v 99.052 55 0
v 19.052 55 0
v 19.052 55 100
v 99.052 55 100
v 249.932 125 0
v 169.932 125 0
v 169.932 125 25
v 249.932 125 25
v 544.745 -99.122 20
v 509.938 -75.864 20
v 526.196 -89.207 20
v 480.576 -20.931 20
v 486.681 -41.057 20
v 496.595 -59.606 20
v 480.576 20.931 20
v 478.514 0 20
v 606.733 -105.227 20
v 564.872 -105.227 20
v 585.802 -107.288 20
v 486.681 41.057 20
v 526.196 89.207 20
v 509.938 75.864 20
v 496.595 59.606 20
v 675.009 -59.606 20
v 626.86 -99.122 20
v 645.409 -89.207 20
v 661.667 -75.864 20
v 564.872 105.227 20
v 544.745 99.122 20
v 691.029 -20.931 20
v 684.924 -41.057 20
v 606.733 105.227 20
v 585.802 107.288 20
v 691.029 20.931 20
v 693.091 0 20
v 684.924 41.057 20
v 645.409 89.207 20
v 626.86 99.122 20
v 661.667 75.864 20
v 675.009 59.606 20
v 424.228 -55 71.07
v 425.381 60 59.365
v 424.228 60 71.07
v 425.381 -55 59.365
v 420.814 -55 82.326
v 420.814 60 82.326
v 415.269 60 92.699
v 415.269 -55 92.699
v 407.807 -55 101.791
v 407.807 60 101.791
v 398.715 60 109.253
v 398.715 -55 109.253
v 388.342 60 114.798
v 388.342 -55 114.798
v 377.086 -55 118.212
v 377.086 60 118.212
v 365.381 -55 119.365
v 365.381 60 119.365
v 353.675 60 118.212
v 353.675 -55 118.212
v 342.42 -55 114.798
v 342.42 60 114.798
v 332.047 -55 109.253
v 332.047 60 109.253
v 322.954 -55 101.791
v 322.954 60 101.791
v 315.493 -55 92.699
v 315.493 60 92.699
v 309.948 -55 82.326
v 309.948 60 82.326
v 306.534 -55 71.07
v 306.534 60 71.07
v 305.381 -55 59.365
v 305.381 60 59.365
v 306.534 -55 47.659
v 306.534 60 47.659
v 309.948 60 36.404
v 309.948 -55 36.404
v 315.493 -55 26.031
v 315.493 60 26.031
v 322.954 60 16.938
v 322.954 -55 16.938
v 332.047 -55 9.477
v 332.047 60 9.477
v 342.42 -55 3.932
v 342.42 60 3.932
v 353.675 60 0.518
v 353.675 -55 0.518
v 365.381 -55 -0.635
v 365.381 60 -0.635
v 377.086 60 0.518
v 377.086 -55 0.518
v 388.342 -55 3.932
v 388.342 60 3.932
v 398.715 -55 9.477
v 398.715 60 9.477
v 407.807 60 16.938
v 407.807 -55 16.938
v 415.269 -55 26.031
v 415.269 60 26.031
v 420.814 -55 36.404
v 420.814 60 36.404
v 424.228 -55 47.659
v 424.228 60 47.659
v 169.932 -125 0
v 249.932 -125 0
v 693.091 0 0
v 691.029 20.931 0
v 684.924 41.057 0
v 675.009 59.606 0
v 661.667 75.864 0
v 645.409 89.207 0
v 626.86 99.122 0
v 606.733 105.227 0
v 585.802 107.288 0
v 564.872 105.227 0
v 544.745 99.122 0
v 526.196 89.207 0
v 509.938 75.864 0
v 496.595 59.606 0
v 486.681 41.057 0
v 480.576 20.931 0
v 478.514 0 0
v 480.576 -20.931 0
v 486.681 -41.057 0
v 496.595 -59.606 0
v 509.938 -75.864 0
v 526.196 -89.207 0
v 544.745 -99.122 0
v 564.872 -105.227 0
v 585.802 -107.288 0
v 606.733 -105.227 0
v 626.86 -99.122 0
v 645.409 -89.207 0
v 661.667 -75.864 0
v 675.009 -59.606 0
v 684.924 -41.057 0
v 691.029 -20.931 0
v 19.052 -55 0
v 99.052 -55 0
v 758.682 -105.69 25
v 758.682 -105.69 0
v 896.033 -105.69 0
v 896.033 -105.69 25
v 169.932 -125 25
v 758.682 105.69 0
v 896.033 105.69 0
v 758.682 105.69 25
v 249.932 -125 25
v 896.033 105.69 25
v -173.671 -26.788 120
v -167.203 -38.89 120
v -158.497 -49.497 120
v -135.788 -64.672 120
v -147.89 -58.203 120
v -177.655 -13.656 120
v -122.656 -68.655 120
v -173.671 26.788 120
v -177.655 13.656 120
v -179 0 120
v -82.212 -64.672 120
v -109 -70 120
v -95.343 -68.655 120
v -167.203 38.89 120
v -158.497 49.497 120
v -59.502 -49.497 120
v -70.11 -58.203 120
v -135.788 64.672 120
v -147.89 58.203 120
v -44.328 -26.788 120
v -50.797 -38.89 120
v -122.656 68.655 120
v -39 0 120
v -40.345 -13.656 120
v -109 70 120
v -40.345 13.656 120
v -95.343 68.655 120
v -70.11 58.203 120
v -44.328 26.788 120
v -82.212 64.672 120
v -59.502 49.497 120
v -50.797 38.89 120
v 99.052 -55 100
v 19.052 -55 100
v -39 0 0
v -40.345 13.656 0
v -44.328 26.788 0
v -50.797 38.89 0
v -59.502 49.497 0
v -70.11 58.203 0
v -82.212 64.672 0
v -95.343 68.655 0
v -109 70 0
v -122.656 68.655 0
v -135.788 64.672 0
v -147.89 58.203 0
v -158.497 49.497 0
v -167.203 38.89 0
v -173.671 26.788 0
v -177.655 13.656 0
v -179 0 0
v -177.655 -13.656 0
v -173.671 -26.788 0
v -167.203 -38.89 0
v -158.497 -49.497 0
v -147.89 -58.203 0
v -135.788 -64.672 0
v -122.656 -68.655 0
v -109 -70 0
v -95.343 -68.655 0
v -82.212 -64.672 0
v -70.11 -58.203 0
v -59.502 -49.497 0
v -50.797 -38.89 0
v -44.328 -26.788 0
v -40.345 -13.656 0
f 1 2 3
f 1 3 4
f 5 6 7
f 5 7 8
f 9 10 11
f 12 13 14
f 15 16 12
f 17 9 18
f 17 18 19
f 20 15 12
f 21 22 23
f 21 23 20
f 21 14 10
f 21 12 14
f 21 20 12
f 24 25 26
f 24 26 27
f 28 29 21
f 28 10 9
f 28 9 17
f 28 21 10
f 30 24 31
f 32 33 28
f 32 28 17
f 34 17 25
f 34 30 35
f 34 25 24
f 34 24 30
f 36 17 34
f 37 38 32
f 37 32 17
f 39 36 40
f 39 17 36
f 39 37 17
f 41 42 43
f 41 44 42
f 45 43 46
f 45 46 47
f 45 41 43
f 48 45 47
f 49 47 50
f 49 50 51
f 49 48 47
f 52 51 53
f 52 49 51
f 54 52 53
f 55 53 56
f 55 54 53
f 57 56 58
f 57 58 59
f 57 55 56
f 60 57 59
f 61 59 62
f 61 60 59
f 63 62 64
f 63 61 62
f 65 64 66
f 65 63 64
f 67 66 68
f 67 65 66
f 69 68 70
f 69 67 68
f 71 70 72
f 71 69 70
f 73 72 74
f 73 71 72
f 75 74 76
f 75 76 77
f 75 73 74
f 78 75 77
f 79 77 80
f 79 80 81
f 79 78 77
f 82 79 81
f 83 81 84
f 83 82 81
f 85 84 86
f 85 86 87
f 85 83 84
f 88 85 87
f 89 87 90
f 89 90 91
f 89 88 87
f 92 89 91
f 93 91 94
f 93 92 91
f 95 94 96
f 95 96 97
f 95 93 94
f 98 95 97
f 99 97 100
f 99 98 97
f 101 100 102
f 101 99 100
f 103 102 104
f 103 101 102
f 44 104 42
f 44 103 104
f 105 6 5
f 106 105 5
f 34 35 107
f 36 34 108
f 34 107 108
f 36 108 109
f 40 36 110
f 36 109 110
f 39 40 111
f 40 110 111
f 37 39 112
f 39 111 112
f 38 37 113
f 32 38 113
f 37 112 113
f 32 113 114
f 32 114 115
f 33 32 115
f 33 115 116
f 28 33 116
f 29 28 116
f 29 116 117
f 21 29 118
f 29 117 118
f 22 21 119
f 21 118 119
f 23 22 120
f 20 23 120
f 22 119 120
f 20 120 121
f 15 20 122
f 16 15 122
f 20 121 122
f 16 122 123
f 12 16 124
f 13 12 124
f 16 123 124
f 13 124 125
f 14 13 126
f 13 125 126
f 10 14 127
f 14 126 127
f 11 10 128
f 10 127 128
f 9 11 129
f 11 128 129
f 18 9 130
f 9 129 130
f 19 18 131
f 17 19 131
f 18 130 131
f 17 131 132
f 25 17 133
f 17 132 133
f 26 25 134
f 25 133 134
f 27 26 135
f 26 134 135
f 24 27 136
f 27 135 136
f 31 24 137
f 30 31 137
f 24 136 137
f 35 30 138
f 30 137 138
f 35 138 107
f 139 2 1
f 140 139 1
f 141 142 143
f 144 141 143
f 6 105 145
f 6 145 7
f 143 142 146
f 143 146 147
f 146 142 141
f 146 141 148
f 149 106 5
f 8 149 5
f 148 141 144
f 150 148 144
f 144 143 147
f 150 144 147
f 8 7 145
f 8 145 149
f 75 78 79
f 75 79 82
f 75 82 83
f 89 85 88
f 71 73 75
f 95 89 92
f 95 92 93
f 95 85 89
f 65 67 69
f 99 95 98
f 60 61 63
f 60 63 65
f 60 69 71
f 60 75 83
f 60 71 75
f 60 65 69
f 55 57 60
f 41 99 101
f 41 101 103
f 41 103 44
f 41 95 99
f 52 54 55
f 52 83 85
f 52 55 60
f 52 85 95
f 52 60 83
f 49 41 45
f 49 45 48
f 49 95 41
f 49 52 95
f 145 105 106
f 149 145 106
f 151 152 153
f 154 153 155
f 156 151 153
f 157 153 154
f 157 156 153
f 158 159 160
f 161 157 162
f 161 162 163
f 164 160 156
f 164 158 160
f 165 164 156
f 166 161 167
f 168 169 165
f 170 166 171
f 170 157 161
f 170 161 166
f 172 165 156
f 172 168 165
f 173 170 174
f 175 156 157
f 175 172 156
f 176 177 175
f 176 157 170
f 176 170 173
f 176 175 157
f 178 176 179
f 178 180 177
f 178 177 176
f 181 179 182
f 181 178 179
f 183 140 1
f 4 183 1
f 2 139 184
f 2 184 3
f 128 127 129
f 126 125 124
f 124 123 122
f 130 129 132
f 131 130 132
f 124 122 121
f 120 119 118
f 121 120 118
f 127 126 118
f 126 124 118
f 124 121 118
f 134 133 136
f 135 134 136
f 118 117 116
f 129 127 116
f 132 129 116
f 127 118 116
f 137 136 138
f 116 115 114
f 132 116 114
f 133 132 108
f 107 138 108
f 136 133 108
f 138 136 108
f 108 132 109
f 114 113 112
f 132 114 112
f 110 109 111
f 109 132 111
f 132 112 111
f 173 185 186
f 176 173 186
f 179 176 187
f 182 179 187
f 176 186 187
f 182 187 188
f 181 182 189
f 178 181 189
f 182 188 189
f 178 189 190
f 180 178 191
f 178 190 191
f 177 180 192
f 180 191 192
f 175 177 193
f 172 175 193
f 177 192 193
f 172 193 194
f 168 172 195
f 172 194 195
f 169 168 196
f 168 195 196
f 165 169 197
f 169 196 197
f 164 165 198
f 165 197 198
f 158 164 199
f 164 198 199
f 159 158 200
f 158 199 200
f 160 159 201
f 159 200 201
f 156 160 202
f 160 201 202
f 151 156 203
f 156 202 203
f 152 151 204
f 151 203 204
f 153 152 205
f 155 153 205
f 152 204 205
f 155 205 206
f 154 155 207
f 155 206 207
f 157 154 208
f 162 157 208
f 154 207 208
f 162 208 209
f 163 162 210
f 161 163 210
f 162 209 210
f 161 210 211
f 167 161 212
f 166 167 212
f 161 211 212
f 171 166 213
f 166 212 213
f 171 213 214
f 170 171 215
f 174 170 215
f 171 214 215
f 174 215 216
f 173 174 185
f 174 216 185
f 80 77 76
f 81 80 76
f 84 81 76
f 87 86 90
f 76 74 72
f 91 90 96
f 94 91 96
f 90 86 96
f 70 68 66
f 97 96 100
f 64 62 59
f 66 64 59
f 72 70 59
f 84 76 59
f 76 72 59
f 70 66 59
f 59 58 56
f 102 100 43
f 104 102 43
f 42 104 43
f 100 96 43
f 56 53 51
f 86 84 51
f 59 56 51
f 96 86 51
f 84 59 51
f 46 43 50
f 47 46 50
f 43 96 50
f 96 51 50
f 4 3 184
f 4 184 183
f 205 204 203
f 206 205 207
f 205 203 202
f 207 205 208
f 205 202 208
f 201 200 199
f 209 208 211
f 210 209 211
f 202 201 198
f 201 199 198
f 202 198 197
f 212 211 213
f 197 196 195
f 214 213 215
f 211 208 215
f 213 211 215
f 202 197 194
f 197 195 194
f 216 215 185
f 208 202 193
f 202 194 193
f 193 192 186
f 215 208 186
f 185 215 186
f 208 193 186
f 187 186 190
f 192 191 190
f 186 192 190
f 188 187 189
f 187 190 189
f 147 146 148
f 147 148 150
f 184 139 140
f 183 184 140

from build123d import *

# Parameters (mm, degrees)
F0_R          = 70
F1_DEPTH      = 120
F2_W          = 80
F2_H          = 110
F3_DEPTH      = 100
F4_W          = 80
F4_H          = 250
F5_DEPTH      = 25
F6_R          = 60
F7_DEPTH      = 55
F7_DEPTH_BACK = 60
F8_R          = 107.288389
F9_DEPTH      = 20
F10_W         = 137.351155
F10_H         = 211.380974
F11_DEPTH     = 25


with BuildPart() as f1:
    # F0 (on Top) → F1 (new body)
    with BuildSketch(Plane.XY):
        with Locations((-108.999747, 0)):
            Circle(F0_R)
    extrude(amount=F1_DEPTH)


with BuildPart() as f3:
    # F2 (on Top) → F3 (new body)
    with BuildSketch(Plane.XY):
        with Locations((59.051738, 0)):
            Rectangle(F2_W, F2_H)
    extrude(amount=F3_DEPTH)


with BuildPart() as f5:
    # F4 (on Top) → F5 (new body)
    with BuildSketch(Plane.XY):
        with Locations((209.931925, 0)):
            Rectangle(F4_W, F4_H)
    extrude(amount=F5_DEPTH)


with BuildPart() as f7:
    # F6 (on Front) → F7 (new body, two sides)
    with BuildSketch(Plane.XZ) as f7_sk:
        with Locations((365.380824, 59.364893)):
            Circle(F6_R)
    extrude(amount=F7_DEPTH)
    extrude(f7_sk.sketch, amount=-F7_DEPTH_BACK)


with BuildPart() as f9:
    # F8 (on Top) → F9 (new body)
    with BuildSketch(Plane.XY):
        with Locations((585.802436, 0)):
            Circle(F8_R)
    extrude(amount=F9_DEPTH)


with BuildPart() as f11:
    # F10 (on Top) → F11 (new body)
    with BuildSketch(Plane.XY):
        with Locations((827.357828, 0)):
            Rectangle(F10_W, F10_H)
    extrude(amount=F11_DEPTH)


solid = Compound([f1.part, f3.part, f5.part, f7.part, f9.part, f11.part])
